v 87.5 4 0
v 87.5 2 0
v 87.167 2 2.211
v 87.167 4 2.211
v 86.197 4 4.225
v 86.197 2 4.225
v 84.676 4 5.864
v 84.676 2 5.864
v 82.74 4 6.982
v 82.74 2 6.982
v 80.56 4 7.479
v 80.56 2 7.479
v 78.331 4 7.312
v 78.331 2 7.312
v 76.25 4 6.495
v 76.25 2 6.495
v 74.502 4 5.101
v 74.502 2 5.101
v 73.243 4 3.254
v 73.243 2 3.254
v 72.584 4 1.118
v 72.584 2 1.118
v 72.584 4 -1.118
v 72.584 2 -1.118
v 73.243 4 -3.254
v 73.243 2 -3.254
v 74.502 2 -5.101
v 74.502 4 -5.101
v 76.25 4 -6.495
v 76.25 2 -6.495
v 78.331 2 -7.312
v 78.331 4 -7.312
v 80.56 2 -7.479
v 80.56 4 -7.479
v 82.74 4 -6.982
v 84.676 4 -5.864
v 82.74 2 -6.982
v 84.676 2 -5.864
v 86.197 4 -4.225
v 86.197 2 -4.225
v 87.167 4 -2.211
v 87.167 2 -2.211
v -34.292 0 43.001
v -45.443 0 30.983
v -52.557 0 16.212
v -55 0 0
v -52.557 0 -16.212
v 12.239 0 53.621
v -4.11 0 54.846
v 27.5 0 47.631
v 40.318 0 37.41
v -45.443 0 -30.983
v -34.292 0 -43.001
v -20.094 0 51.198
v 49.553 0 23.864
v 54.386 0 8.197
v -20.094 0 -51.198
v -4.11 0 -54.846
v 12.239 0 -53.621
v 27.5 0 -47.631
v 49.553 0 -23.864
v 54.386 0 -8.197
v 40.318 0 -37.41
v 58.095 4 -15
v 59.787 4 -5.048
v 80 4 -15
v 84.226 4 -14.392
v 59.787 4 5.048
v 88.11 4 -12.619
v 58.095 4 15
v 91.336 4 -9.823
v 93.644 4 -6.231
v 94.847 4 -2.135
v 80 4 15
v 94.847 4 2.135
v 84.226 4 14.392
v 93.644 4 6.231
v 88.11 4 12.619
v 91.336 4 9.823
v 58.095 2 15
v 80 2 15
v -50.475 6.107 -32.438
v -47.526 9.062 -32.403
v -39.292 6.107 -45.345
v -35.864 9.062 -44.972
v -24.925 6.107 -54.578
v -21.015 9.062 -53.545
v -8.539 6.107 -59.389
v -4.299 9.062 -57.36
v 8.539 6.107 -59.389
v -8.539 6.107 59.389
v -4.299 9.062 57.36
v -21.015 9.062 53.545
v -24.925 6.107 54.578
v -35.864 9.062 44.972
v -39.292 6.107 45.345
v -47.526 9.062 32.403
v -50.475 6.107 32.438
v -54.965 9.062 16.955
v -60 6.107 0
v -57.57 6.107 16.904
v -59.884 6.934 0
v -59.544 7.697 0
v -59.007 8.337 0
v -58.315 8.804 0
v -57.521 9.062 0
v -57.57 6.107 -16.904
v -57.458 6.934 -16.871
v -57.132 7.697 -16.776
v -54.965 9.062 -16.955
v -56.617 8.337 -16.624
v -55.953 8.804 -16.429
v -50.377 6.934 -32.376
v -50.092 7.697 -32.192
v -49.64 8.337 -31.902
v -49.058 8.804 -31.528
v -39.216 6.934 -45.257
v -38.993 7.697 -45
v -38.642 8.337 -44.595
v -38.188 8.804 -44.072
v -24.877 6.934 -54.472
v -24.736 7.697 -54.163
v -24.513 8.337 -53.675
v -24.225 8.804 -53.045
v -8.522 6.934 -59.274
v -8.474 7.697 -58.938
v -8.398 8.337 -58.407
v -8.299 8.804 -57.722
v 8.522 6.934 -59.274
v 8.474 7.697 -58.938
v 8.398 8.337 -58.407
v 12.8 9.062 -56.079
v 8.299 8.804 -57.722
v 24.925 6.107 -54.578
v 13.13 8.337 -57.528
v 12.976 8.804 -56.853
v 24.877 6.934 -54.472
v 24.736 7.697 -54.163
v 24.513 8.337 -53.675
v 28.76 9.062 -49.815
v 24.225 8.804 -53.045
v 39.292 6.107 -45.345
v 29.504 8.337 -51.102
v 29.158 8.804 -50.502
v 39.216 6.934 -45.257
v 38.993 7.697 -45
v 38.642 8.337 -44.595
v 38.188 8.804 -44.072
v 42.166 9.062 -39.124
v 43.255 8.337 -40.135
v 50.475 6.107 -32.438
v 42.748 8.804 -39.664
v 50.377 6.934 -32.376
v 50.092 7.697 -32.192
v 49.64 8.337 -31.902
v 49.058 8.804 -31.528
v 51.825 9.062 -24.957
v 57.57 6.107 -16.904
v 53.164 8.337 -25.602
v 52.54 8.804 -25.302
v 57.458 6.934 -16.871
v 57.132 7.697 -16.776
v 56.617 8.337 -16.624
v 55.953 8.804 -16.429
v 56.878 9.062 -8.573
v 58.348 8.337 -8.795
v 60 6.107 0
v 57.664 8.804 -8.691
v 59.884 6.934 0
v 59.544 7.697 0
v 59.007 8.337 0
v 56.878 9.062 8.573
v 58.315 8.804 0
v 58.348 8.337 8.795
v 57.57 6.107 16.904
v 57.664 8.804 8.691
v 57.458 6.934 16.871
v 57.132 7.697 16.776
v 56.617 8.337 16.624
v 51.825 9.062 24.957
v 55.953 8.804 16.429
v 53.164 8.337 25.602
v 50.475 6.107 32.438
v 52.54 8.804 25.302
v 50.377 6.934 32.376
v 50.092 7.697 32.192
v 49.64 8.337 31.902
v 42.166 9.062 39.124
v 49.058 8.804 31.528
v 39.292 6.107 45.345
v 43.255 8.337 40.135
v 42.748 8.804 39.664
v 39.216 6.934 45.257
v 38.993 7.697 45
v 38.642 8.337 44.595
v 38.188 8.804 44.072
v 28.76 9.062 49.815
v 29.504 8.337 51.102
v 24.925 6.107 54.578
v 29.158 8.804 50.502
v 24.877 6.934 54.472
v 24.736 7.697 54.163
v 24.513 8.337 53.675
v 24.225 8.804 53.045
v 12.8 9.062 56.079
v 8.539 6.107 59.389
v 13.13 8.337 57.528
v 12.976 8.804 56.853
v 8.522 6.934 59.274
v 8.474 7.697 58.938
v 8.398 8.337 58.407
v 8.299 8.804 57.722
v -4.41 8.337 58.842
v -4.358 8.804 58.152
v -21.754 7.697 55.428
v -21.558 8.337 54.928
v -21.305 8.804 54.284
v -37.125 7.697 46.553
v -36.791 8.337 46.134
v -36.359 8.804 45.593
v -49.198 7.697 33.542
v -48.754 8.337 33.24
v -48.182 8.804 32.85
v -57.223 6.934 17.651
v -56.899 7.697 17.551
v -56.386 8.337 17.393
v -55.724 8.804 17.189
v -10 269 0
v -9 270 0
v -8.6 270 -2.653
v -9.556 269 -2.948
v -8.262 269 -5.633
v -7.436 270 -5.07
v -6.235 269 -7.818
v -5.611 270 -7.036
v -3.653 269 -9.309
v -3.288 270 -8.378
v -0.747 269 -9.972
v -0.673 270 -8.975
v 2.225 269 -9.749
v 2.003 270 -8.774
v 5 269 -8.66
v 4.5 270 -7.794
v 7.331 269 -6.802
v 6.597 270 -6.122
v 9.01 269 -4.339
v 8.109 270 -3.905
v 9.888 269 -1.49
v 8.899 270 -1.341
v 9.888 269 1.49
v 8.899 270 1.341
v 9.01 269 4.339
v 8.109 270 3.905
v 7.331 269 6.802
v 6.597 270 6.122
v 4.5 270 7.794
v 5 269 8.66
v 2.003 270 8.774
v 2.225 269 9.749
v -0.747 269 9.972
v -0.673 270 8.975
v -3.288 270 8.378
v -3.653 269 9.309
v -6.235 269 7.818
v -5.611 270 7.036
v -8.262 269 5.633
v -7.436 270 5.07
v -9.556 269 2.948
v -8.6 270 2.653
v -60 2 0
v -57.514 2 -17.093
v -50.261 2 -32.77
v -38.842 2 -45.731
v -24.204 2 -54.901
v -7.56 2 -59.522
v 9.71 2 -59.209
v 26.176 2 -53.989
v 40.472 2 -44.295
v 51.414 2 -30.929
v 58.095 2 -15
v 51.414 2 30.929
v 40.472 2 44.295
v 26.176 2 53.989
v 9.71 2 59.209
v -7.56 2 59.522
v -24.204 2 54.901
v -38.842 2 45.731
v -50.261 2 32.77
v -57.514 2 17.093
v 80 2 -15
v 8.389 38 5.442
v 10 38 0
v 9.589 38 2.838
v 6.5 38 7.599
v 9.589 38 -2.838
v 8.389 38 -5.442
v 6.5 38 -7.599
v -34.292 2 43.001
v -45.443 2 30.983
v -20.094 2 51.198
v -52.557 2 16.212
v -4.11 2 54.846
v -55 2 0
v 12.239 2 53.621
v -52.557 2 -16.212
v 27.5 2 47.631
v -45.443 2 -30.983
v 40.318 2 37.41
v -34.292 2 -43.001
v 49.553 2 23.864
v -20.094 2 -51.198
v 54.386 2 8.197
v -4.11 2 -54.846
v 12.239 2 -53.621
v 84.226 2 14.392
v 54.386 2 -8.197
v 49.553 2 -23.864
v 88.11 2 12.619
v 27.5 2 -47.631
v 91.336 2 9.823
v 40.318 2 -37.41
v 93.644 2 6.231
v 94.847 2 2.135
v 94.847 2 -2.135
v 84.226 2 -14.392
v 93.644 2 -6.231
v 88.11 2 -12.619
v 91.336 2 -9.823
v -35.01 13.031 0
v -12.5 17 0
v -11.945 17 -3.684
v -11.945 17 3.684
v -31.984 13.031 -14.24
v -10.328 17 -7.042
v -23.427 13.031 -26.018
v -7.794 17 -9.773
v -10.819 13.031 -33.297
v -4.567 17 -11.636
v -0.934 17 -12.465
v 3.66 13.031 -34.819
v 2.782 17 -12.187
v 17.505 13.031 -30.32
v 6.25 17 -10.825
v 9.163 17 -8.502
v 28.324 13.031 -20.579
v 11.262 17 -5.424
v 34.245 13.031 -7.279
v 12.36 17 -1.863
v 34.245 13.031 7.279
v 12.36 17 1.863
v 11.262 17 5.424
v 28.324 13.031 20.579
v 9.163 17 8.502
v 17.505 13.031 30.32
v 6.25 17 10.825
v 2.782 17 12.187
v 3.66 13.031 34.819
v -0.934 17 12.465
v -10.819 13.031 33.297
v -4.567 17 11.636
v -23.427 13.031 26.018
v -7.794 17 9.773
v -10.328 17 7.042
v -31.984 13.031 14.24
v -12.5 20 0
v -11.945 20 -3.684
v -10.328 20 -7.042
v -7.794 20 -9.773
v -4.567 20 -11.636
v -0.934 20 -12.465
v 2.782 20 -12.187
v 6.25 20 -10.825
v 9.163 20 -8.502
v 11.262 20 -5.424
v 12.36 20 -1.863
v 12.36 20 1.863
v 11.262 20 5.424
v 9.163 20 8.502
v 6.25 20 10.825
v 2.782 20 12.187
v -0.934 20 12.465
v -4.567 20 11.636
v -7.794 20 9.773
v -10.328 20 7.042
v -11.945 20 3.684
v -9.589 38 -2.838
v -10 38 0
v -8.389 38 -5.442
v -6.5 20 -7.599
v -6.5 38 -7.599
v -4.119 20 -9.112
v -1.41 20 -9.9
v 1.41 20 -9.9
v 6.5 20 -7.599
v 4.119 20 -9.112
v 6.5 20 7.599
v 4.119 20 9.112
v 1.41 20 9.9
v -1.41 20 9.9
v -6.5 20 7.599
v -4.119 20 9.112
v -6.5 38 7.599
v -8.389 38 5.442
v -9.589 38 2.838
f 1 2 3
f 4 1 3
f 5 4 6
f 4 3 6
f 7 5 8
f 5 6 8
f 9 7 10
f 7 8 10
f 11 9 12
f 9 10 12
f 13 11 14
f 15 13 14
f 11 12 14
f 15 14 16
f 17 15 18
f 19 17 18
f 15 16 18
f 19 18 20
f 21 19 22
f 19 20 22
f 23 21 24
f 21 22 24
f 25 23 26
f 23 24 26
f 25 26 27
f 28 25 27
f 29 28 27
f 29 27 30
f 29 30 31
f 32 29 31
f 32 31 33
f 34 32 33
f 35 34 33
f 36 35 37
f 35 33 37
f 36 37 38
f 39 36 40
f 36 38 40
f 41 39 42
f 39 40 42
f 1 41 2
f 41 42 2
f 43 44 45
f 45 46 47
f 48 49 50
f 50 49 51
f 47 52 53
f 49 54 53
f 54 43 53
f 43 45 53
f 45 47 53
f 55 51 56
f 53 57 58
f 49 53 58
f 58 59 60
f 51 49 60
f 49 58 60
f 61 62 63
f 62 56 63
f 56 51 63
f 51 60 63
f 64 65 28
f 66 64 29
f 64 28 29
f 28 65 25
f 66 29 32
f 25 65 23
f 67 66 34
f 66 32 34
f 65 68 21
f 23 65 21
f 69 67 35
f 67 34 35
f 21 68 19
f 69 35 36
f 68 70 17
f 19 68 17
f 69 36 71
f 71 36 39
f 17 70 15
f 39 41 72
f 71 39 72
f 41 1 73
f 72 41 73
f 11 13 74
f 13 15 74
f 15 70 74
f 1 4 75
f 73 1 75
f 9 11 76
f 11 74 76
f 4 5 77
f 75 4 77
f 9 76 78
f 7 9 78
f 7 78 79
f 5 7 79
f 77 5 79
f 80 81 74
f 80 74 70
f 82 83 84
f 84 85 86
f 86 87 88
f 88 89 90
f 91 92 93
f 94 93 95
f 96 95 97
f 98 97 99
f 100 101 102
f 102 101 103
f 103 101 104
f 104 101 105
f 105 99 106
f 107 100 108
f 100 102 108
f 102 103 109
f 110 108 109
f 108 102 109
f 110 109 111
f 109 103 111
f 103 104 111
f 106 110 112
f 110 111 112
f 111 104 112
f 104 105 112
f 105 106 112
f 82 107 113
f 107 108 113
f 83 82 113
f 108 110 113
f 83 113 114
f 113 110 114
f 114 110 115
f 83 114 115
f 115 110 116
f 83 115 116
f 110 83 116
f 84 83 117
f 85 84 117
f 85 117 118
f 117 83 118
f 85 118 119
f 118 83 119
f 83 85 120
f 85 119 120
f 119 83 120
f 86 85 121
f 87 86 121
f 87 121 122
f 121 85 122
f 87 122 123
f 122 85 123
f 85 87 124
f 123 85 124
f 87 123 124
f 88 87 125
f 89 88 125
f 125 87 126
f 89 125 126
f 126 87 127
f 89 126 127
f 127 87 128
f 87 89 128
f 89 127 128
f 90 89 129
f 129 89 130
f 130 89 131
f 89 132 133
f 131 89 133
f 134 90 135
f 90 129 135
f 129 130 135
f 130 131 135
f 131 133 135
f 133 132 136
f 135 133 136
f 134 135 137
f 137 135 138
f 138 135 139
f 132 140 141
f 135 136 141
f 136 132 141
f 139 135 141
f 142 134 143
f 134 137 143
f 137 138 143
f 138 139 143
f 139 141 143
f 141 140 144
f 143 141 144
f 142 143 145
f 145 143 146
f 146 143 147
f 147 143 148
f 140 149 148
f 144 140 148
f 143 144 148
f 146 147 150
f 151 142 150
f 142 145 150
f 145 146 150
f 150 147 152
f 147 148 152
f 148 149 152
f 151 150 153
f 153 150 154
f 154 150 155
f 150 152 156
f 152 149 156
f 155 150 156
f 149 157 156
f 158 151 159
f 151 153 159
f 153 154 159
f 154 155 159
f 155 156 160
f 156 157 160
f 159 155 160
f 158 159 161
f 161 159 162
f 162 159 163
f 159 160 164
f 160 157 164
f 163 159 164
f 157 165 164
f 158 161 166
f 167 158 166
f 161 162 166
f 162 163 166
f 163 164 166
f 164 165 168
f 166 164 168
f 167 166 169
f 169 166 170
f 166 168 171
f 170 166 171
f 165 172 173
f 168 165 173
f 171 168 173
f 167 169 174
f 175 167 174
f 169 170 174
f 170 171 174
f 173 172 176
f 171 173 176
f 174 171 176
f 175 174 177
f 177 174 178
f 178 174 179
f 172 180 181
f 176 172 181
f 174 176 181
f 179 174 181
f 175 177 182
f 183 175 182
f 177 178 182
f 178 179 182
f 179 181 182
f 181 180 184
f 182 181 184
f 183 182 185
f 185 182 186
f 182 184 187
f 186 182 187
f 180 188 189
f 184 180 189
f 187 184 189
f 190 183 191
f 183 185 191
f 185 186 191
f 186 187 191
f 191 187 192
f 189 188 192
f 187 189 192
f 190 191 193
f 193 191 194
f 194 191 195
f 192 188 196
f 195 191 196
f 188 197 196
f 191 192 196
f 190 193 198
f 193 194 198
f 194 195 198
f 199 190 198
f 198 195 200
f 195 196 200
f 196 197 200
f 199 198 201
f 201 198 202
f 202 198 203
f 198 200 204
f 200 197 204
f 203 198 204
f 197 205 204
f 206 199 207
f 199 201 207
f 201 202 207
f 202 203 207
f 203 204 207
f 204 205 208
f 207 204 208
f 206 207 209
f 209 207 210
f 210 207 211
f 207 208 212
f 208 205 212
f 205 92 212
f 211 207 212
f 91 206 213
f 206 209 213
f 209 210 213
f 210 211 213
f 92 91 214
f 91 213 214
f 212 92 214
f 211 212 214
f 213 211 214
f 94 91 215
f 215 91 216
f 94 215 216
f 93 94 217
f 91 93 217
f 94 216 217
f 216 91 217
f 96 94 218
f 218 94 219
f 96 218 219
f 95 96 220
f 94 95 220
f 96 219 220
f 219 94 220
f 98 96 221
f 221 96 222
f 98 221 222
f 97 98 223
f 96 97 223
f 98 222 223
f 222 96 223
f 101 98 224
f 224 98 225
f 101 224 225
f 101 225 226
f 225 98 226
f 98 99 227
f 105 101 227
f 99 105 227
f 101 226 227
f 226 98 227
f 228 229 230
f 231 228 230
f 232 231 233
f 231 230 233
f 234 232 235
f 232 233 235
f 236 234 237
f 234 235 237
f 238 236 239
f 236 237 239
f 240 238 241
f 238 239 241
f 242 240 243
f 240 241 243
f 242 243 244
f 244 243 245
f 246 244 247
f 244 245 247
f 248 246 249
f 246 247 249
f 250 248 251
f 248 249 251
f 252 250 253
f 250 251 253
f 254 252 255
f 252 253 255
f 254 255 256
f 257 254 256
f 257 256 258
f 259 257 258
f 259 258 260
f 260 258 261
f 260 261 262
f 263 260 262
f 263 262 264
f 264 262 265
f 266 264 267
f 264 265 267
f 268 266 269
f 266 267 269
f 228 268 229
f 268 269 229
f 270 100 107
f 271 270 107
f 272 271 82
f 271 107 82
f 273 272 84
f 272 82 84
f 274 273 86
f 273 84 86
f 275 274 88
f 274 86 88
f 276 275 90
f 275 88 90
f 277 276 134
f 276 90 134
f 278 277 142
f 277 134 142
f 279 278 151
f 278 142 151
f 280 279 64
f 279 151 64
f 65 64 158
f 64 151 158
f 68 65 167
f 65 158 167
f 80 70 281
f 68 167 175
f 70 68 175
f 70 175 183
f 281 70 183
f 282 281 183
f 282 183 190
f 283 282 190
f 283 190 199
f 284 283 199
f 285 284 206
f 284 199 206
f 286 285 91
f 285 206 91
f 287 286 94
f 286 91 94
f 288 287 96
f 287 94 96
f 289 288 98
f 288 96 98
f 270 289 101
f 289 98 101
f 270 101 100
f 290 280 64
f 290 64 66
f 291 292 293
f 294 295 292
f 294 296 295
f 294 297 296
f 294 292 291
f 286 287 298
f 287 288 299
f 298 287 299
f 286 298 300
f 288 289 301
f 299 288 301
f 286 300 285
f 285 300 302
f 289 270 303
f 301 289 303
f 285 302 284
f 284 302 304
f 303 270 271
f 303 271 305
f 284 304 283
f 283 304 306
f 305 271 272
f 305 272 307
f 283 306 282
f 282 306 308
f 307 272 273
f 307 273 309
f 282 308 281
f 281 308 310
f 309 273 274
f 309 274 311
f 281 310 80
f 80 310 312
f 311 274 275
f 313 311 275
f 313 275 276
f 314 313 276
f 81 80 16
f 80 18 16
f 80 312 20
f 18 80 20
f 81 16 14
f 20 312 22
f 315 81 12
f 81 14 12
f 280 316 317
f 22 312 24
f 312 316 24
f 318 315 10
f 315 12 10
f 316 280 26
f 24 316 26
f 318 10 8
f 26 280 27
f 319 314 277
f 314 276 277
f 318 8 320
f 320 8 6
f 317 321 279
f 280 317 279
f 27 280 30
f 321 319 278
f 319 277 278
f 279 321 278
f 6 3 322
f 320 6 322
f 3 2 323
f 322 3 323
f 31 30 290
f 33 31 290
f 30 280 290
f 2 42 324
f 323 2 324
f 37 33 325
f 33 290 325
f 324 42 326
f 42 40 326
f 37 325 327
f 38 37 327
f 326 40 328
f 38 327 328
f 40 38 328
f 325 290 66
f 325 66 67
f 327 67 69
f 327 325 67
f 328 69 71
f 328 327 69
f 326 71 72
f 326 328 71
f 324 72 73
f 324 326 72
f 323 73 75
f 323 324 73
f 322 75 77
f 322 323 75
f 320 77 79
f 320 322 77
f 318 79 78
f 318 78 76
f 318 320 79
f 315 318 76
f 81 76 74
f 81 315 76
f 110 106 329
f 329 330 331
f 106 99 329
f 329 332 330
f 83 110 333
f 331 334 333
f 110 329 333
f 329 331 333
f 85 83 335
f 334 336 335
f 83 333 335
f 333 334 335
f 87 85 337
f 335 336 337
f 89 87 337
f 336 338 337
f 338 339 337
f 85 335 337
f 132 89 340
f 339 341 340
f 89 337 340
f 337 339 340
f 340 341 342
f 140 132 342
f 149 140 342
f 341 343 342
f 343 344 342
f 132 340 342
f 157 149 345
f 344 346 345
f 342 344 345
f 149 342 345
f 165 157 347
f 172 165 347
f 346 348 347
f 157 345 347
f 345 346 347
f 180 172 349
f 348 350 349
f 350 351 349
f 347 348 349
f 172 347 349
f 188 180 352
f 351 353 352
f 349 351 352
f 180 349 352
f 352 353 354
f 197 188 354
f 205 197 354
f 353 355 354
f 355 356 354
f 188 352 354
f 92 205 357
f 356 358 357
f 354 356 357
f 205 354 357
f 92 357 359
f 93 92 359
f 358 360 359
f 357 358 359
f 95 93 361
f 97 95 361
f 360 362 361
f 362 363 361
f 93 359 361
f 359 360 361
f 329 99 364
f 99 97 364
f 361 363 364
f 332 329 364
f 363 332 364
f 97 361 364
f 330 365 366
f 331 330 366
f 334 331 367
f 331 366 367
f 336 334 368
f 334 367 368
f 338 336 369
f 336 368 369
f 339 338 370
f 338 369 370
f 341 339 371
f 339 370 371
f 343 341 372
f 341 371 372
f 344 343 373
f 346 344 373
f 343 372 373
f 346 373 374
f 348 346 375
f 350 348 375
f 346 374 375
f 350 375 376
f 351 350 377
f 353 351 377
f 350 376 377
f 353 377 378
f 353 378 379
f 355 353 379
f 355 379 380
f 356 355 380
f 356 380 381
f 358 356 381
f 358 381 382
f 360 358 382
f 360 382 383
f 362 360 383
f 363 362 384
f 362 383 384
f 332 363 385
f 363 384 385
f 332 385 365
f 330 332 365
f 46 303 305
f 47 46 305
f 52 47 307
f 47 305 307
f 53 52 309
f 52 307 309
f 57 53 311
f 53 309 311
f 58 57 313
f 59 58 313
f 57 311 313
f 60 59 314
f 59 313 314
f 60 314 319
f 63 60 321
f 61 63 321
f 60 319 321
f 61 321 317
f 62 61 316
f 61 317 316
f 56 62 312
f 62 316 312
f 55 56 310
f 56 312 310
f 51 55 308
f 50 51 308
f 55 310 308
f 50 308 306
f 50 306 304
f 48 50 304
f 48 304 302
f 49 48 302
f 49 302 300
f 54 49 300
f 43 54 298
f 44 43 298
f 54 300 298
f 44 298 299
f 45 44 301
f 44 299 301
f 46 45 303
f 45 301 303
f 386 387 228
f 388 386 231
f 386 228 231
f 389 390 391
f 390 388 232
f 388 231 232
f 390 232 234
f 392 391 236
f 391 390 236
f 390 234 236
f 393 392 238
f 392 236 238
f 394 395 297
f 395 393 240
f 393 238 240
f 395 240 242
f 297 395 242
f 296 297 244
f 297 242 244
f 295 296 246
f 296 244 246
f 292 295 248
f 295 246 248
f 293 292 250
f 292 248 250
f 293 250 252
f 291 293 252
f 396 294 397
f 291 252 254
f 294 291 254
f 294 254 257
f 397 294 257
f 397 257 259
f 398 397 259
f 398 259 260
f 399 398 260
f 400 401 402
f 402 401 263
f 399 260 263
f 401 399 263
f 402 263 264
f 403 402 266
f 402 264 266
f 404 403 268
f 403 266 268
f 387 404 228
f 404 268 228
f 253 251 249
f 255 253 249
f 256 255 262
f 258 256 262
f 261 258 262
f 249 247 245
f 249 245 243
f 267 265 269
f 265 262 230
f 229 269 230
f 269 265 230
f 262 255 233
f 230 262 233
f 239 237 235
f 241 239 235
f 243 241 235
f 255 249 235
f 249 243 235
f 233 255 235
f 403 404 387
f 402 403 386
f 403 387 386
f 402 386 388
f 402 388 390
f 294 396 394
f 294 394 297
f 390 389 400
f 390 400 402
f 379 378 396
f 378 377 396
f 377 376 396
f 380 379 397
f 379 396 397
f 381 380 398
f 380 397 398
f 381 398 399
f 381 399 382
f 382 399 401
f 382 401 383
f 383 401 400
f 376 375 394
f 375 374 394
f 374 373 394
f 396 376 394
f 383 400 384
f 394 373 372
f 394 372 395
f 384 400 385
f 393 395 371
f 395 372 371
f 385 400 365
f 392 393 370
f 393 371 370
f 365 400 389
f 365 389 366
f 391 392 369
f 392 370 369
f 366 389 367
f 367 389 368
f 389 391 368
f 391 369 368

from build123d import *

# Parameters (mm, degrees)
FASE1_SIZE                      = 1
SKIZZE2_W                       = 3.5
SKIZZE2_H                       = 18
SCHNITT_LINEAR_AUSTRAGEN1_DEPTH = 10
SKIZZE3_R                       = 7.5
AUFSATZ_LINEAR_AUSTRAGEN1_DEPTH = 2


with BuildPart() as part:
    # Skizze1 → Rotation1 (revolve)
    with BuildSketch(Plane.XY):
        with BuildLine():
            Line((0, 0), (-55, 0))
            Line((-55, 0), (-55, 2))
            Line((-55, 2), (-60, 2))
            Line((-60, 2), (-60, 6.107169523))
            ThreePointArc((-60, 6.107169523), (-59.298133329, 8.035532352), (-57.520944533, 9.061592782))
            Line((-57.520944533, 9.061592782), (-12.5, 17))
            Line((-12.5, 17), (-12.5, 20))
            Line((-12.5, 20), (-10, 20))
            Line((-10, 20), (-10, 270))
            Line((-10, 270), (0, 270))
            Line((0, 270), (0, 0))
        make_face()
    revolve(axis=Axis((0, 290, 0), (0, -1, 0)))

    # Fase1
    fase1_edges = [part.edges().sort_by_distance(p)[0] for p in [
        (10, 270, 0),
    ]]
    chamfer(fase1_edges, length=FASE1_SIZE)

    # Skizze2 → Schnitt-Linear austragen1 (cut, symmetric)
    with BuildSketch(Plane.XY):
        with Locations((-8.25, 29)):
            Rectangle(SKIZZE2_W, SKIZZE2_H)
        with Locations((8.25, 29)):
            Rectangle(SKIZZE2_W, SKIZZE2_H)
    extrude(amount=SCHNITT_LINEAR_AUSTRAGEN1_DEPTH, both=True, mode=Mode.SUBTRACT)

    # Skizze3 → Aufsatz-Linear austragen1 (add)
    with BuildSketch(Plane.XZ.offset(-2)):
        with BuildLine():
            Line((0, 15), (0, -15))
            Line((0, -15), (80, -15))
            ThreePointArc((80, -15), (95, 0), (80, 15))
            Line((80, 15), (0, 15))
        make_face()
        with Locations((80, 0)):
            Circle(SKIZZE3_R, mode=Mode.SUBTRACT)
    extrude(amount=-AUFSATZ_LINEAR_AUSTRAGEN1_DEPTH)


solid = part.part
